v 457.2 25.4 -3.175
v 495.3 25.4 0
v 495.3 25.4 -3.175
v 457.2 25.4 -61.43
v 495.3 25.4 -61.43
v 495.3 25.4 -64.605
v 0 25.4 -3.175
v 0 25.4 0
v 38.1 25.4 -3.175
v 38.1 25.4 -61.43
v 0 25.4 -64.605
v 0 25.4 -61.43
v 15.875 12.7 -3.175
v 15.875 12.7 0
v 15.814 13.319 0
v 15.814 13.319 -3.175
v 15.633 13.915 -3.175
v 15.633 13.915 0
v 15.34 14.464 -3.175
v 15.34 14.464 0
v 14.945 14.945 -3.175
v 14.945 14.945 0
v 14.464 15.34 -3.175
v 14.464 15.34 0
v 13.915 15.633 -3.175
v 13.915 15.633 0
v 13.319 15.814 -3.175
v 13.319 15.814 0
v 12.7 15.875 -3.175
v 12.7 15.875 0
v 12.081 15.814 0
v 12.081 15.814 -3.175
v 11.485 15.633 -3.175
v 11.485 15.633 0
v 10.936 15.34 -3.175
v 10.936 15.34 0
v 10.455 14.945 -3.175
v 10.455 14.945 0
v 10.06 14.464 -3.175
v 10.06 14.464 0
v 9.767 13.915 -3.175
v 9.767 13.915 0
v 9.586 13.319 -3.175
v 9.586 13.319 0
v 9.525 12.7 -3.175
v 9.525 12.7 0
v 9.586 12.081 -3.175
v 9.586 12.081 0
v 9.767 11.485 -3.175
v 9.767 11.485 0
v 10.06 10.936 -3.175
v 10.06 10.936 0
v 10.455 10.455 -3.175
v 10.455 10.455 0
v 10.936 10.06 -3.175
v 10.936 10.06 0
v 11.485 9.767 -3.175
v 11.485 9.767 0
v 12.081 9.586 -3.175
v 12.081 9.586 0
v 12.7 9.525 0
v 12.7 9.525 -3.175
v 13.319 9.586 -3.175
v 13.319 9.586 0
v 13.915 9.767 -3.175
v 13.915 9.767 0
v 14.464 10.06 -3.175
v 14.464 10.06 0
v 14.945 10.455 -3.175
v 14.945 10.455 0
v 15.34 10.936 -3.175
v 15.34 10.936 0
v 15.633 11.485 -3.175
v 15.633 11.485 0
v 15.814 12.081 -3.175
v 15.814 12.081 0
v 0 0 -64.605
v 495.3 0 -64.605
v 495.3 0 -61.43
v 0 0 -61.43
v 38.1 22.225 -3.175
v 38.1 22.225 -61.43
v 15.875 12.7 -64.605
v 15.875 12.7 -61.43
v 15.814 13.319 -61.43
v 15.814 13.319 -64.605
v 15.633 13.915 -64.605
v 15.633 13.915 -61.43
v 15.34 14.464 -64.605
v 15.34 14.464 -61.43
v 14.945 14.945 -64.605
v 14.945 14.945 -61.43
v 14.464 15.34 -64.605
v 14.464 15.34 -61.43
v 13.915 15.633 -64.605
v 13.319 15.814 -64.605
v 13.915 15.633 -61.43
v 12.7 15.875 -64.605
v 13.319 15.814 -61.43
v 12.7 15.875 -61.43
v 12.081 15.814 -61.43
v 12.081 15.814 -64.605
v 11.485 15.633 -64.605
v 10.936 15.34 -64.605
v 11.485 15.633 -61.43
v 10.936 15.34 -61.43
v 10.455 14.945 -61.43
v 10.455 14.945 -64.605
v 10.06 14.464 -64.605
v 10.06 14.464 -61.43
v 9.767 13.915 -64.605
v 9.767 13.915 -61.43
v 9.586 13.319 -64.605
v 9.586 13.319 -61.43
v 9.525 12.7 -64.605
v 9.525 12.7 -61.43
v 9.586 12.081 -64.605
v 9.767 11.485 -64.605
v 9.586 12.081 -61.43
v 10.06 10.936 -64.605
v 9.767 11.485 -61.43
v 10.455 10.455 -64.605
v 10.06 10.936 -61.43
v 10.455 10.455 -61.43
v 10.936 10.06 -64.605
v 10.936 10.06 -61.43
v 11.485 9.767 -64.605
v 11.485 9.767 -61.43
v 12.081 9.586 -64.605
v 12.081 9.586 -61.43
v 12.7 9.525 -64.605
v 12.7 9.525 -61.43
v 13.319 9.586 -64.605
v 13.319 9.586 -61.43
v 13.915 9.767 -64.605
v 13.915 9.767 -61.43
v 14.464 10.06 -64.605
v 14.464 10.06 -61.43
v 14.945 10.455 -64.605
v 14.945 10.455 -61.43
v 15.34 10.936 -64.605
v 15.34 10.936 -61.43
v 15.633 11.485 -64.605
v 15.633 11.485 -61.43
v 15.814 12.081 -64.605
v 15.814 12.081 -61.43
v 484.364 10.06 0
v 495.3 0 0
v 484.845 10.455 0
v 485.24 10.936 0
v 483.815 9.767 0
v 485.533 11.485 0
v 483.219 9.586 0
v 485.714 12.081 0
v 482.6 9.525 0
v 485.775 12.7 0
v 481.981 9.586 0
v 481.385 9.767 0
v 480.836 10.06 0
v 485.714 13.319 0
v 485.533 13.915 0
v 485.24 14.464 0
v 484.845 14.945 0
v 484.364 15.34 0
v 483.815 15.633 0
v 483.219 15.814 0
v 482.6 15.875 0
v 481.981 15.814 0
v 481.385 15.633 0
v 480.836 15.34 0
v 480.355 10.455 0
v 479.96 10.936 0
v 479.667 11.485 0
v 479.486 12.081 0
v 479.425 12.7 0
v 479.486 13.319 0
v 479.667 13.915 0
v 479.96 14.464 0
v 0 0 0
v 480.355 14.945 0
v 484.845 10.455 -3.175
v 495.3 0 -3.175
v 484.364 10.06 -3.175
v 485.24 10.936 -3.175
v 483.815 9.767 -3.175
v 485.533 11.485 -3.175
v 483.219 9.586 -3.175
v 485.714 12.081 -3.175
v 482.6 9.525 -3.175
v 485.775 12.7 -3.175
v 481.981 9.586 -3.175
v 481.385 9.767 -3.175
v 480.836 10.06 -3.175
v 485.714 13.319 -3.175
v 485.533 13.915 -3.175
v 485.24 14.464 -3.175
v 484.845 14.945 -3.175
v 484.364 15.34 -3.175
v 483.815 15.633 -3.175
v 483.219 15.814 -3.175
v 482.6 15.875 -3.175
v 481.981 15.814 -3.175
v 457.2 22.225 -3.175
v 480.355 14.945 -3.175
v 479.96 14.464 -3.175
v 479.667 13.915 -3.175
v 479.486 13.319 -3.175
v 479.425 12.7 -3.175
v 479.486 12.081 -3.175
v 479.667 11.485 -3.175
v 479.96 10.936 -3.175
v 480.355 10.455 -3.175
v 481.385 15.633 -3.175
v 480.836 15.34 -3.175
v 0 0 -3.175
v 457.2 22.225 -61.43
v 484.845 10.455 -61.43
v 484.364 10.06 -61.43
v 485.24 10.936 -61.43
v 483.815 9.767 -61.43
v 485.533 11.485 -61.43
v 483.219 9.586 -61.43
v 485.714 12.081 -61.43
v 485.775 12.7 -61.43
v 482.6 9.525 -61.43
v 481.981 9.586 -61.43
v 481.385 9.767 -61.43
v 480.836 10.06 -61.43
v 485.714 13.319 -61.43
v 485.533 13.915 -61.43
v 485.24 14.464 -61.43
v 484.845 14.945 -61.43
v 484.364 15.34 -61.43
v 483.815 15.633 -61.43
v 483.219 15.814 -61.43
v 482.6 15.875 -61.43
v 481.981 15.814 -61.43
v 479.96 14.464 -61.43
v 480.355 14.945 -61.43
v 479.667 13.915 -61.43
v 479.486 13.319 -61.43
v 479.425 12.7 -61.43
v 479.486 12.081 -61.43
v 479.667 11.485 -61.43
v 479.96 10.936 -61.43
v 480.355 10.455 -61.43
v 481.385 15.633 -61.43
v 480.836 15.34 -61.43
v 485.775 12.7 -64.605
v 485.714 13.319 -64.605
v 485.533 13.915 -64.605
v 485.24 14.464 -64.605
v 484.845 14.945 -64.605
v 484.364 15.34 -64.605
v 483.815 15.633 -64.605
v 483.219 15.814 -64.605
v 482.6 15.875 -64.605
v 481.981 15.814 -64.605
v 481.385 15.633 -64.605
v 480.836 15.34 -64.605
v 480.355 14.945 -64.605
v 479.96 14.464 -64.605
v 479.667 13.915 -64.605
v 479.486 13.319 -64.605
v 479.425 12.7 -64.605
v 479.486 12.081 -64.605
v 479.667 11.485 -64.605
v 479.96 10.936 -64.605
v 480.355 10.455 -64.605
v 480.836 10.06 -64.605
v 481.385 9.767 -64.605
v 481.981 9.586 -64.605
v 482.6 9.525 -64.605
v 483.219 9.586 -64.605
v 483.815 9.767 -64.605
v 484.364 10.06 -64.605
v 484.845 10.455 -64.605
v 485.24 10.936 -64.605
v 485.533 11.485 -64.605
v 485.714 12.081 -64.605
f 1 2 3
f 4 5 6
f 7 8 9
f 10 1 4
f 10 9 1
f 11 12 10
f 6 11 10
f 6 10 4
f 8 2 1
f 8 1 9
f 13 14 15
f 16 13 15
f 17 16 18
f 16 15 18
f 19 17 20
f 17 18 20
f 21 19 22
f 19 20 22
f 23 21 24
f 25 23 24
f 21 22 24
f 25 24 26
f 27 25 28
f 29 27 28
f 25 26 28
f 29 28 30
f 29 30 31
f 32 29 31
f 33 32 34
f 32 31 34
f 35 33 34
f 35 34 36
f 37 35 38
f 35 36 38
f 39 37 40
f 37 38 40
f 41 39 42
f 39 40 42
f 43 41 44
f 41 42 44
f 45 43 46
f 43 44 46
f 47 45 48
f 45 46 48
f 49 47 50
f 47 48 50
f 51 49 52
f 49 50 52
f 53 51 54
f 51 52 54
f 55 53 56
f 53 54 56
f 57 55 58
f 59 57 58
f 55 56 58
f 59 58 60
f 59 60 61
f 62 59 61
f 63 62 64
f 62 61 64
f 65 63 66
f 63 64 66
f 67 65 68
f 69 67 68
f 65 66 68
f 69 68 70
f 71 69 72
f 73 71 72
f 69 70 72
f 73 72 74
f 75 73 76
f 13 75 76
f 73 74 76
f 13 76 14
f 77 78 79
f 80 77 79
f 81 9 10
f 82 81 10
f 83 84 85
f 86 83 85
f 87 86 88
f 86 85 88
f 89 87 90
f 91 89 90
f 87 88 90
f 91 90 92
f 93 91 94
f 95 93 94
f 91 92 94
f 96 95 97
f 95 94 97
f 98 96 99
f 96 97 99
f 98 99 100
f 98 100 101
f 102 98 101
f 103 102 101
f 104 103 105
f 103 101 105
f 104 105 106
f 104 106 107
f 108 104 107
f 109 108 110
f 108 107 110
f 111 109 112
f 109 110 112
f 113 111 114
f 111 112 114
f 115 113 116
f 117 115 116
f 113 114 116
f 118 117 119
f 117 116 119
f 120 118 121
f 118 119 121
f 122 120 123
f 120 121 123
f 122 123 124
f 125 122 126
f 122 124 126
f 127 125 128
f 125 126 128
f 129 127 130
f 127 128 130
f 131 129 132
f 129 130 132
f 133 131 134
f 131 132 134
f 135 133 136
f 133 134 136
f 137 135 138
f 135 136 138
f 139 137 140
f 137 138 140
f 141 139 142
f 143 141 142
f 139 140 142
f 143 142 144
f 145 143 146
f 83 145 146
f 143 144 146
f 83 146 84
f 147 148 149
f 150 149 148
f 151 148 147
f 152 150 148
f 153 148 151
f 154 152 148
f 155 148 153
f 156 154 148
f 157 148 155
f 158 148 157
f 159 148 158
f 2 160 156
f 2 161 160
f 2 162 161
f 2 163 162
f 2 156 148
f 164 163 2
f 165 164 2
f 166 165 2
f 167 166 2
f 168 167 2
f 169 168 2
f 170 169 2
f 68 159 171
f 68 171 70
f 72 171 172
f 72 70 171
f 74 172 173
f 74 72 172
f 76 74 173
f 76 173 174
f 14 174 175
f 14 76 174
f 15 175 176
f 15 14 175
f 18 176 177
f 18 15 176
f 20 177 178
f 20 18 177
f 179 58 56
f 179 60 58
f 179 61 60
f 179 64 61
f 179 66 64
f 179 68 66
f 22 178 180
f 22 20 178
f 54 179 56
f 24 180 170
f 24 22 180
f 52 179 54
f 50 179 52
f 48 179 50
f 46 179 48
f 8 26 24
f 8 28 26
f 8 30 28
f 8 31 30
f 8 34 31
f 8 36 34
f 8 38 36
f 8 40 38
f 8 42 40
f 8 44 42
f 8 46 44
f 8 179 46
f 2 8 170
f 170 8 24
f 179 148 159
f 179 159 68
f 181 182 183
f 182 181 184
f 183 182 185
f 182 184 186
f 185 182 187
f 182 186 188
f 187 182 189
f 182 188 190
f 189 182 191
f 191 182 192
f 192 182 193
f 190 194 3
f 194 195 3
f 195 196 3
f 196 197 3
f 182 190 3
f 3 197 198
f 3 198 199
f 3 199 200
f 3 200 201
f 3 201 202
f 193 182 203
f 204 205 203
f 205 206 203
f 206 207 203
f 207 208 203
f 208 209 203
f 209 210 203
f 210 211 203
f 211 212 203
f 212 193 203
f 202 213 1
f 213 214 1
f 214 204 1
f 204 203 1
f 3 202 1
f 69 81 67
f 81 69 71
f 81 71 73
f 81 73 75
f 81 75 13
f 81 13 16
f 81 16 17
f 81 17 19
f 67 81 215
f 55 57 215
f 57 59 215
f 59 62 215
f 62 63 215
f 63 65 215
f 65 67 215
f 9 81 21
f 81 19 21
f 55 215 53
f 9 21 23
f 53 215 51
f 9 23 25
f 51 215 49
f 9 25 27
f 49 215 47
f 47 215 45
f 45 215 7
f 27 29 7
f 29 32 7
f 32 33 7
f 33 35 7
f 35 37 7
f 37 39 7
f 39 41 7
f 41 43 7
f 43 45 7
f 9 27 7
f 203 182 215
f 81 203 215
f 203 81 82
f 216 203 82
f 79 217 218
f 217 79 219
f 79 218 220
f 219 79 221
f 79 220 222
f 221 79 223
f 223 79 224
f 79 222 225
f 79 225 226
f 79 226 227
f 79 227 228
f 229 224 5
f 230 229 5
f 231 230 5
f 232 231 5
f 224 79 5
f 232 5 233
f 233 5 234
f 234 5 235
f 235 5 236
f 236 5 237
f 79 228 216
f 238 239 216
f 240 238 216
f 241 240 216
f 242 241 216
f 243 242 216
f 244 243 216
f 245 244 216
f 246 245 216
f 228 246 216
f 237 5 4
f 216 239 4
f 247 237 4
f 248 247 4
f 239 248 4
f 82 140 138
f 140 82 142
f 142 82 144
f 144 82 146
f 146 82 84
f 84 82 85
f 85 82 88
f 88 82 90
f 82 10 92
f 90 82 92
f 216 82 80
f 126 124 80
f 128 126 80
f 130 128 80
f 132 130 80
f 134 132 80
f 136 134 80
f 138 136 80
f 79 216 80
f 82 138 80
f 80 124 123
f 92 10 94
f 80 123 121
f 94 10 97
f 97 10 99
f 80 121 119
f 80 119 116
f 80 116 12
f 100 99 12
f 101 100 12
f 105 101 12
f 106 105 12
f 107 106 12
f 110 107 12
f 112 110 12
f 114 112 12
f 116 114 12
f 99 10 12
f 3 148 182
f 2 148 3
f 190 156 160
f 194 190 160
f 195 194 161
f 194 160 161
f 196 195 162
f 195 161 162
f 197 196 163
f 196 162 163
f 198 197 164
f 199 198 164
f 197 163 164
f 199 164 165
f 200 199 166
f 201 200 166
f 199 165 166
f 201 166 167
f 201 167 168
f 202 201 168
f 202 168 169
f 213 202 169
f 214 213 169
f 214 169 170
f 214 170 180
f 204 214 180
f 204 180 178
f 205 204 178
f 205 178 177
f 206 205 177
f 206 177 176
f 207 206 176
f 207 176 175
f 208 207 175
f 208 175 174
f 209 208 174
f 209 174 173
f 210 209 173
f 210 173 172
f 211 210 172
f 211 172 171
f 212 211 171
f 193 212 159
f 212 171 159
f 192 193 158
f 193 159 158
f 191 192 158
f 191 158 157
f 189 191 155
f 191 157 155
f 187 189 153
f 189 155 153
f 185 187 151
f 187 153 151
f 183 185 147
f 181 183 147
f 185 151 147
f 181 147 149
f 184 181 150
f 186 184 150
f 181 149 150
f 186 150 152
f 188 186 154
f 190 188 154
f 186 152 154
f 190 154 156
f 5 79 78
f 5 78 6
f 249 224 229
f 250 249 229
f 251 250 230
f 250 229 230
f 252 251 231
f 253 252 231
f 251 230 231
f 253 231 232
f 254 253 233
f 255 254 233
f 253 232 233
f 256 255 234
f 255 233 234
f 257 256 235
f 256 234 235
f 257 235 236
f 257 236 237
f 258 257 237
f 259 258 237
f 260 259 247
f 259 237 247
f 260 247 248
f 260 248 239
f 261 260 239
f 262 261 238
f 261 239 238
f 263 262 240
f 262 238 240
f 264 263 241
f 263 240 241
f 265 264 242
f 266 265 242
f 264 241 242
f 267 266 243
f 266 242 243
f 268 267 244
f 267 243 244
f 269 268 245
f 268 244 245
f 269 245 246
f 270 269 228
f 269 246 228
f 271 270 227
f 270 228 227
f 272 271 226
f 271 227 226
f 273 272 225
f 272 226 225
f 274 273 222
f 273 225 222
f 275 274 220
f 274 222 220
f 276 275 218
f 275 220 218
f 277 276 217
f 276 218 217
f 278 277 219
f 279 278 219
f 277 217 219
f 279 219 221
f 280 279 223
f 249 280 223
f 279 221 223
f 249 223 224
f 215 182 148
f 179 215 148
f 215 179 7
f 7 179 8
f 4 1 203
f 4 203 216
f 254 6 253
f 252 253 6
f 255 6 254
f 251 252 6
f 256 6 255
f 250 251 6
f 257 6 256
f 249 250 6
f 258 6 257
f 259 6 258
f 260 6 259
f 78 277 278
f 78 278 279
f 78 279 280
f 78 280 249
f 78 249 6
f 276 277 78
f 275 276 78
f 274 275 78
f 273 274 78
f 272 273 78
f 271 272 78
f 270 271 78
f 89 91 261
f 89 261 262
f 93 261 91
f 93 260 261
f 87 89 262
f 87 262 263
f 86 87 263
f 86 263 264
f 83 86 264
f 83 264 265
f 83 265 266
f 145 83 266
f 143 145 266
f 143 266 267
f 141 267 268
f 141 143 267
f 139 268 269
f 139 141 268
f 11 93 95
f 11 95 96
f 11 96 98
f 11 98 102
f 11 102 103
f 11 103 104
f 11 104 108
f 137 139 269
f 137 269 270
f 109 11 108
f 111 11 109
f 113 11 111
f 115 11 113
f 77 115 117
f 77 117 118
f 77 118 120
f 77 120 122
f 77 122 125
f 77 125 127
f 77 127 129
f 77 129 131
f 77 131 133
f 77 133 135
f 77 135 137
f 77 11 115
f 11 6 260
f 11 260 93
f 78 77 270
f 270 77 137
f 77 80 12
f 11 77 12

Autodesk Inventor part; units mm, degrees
ref_plane "YZ Plane" through (0, 0, 0) normal (1, 0, 0) x (0, 1, 0)
ref_plane "XZ Plane" through (0, 0, 0) normal (0, 1, 0) x (-1, 0, 0)
ref_plane "XY Plane" through (0, 0, 0) normal (0, 0, 1) x (1, 0, 0)
sketch "Sketch1" plane through (0, 0, 0) normal (1, 0, 0) x (0, 1, 0)
  line L0 (0, 0) -> (25.4, 0)
  line L1 (25.4, 0) -> (25.4, -64.6049)
  line L2 (25.4, -64.6049) -> (0, -64.6049)
  line L3 (0, -64.6049) -> (0, 0)
  line L4 (0, -3.175) -> (22.225, -3.175)
  line L5 (22.225, -3.175) -> (22.225, -61.4299)
  line L6 (22.225, -61.4299) -> (0, -61.4299)
  line L7 (0, -61.4299) -> (0, -3.175)
  dimension "d0" = 25.4
  dimension "d2" = 58.2549
  dimension "d3" = 22.225
  dimension "d4" = 3.175
  dimension "d32" = 3.175
extrude "Extrusion1" add sketch "Sketch1" along normal blind 495.3 contours L0 L1 L2 L3 L6 L5 L4
sketch "Sketch3" plane through (0, 25.4, 0) normal (0, 1, 0) x (1, 0, 0)
  line L0 (0, 64.6049) -> (0, 0) projected
  line L1 (0, 0) -> (495.3, 0) projected
  line L2 (495.3, 64.6049) -> (495.3, 0) projected
  line L3 (0, 64.6049) -> (495.3, 64.6049) projected
  line L4 (495.3, 3.175) -> (457.2, 3.175)
  line L5 (457.2, 3.175) -> (457.2, 61.4299)
  line L6 (457.2, 61.4299) -> (495.3, 61.4299)
  line L7 (495.3, 61.4299) -> (495.3, 3.175)
  line L8 (0, 64.6049) -> (0, 0) projected
  line L9 (0, 3.175) -> (38.1, 3.175)
  line L10 (38.1, 3.175) -> (38.1, 61.4299)
  line L11 (38.1, 61.4299) -> (0, 61.4299)
  line L12 (0, 61.4299) -> (0, 3.175)
  point P0 (495.3, 61.4299)
  dimension "d14" = 64.6049
  dimension "d16" = 38.1
  dimension "d27" = 38.1
  dimension "d28" = 58.2549
  dimension "d29" = 3.175
  dimension "d30" = 58.2549
  dimension "d31" = 3.175
extrude "Extrusion2" cut sketch "Sketch3" against normal blind 3.175 contours L11 L10 L9 L0 | L2 L4 L5 L6
sketch "Sketch4" plane through (0, 0, 0) normal (0, 0, 1) x (1, 0, 0)
  line L0 (0, 25.4) -> (0, 0) projected
  line L1 (0, 0) -> (495.3, 0) projected
  line L2 (495.3, 25.4) -> (495.3, 0) projected
  line L3 (0, 25.4) -> (495.3, 25.4) projected
  circle A0 centre (12.7, 12.7) radius 3.175
  circle A1 centre (482.6, 12.7) radius 3.175
  dimension "d19" = 6.35
  dimension "d20" = 12.7
  dimension "d21" = 25.4
  dimension "d22" = 12.7
  dimension "d23" = 6.35
  dimension "d24" = 12.7
extrude "Extrusion3" cut sketch "Sketch4" against normal blind 127 contours A0 | A1
equation "\"d32\" = d4"
equation "\"d30\" = d28"
equation "\"d31\" = d29"
equation "\"d22\" = 0.5 * d21"
equation "\"d23\" = d19"
equation "\"d24\" = d20"
properties part number "ArmProto2.2Assembly"
